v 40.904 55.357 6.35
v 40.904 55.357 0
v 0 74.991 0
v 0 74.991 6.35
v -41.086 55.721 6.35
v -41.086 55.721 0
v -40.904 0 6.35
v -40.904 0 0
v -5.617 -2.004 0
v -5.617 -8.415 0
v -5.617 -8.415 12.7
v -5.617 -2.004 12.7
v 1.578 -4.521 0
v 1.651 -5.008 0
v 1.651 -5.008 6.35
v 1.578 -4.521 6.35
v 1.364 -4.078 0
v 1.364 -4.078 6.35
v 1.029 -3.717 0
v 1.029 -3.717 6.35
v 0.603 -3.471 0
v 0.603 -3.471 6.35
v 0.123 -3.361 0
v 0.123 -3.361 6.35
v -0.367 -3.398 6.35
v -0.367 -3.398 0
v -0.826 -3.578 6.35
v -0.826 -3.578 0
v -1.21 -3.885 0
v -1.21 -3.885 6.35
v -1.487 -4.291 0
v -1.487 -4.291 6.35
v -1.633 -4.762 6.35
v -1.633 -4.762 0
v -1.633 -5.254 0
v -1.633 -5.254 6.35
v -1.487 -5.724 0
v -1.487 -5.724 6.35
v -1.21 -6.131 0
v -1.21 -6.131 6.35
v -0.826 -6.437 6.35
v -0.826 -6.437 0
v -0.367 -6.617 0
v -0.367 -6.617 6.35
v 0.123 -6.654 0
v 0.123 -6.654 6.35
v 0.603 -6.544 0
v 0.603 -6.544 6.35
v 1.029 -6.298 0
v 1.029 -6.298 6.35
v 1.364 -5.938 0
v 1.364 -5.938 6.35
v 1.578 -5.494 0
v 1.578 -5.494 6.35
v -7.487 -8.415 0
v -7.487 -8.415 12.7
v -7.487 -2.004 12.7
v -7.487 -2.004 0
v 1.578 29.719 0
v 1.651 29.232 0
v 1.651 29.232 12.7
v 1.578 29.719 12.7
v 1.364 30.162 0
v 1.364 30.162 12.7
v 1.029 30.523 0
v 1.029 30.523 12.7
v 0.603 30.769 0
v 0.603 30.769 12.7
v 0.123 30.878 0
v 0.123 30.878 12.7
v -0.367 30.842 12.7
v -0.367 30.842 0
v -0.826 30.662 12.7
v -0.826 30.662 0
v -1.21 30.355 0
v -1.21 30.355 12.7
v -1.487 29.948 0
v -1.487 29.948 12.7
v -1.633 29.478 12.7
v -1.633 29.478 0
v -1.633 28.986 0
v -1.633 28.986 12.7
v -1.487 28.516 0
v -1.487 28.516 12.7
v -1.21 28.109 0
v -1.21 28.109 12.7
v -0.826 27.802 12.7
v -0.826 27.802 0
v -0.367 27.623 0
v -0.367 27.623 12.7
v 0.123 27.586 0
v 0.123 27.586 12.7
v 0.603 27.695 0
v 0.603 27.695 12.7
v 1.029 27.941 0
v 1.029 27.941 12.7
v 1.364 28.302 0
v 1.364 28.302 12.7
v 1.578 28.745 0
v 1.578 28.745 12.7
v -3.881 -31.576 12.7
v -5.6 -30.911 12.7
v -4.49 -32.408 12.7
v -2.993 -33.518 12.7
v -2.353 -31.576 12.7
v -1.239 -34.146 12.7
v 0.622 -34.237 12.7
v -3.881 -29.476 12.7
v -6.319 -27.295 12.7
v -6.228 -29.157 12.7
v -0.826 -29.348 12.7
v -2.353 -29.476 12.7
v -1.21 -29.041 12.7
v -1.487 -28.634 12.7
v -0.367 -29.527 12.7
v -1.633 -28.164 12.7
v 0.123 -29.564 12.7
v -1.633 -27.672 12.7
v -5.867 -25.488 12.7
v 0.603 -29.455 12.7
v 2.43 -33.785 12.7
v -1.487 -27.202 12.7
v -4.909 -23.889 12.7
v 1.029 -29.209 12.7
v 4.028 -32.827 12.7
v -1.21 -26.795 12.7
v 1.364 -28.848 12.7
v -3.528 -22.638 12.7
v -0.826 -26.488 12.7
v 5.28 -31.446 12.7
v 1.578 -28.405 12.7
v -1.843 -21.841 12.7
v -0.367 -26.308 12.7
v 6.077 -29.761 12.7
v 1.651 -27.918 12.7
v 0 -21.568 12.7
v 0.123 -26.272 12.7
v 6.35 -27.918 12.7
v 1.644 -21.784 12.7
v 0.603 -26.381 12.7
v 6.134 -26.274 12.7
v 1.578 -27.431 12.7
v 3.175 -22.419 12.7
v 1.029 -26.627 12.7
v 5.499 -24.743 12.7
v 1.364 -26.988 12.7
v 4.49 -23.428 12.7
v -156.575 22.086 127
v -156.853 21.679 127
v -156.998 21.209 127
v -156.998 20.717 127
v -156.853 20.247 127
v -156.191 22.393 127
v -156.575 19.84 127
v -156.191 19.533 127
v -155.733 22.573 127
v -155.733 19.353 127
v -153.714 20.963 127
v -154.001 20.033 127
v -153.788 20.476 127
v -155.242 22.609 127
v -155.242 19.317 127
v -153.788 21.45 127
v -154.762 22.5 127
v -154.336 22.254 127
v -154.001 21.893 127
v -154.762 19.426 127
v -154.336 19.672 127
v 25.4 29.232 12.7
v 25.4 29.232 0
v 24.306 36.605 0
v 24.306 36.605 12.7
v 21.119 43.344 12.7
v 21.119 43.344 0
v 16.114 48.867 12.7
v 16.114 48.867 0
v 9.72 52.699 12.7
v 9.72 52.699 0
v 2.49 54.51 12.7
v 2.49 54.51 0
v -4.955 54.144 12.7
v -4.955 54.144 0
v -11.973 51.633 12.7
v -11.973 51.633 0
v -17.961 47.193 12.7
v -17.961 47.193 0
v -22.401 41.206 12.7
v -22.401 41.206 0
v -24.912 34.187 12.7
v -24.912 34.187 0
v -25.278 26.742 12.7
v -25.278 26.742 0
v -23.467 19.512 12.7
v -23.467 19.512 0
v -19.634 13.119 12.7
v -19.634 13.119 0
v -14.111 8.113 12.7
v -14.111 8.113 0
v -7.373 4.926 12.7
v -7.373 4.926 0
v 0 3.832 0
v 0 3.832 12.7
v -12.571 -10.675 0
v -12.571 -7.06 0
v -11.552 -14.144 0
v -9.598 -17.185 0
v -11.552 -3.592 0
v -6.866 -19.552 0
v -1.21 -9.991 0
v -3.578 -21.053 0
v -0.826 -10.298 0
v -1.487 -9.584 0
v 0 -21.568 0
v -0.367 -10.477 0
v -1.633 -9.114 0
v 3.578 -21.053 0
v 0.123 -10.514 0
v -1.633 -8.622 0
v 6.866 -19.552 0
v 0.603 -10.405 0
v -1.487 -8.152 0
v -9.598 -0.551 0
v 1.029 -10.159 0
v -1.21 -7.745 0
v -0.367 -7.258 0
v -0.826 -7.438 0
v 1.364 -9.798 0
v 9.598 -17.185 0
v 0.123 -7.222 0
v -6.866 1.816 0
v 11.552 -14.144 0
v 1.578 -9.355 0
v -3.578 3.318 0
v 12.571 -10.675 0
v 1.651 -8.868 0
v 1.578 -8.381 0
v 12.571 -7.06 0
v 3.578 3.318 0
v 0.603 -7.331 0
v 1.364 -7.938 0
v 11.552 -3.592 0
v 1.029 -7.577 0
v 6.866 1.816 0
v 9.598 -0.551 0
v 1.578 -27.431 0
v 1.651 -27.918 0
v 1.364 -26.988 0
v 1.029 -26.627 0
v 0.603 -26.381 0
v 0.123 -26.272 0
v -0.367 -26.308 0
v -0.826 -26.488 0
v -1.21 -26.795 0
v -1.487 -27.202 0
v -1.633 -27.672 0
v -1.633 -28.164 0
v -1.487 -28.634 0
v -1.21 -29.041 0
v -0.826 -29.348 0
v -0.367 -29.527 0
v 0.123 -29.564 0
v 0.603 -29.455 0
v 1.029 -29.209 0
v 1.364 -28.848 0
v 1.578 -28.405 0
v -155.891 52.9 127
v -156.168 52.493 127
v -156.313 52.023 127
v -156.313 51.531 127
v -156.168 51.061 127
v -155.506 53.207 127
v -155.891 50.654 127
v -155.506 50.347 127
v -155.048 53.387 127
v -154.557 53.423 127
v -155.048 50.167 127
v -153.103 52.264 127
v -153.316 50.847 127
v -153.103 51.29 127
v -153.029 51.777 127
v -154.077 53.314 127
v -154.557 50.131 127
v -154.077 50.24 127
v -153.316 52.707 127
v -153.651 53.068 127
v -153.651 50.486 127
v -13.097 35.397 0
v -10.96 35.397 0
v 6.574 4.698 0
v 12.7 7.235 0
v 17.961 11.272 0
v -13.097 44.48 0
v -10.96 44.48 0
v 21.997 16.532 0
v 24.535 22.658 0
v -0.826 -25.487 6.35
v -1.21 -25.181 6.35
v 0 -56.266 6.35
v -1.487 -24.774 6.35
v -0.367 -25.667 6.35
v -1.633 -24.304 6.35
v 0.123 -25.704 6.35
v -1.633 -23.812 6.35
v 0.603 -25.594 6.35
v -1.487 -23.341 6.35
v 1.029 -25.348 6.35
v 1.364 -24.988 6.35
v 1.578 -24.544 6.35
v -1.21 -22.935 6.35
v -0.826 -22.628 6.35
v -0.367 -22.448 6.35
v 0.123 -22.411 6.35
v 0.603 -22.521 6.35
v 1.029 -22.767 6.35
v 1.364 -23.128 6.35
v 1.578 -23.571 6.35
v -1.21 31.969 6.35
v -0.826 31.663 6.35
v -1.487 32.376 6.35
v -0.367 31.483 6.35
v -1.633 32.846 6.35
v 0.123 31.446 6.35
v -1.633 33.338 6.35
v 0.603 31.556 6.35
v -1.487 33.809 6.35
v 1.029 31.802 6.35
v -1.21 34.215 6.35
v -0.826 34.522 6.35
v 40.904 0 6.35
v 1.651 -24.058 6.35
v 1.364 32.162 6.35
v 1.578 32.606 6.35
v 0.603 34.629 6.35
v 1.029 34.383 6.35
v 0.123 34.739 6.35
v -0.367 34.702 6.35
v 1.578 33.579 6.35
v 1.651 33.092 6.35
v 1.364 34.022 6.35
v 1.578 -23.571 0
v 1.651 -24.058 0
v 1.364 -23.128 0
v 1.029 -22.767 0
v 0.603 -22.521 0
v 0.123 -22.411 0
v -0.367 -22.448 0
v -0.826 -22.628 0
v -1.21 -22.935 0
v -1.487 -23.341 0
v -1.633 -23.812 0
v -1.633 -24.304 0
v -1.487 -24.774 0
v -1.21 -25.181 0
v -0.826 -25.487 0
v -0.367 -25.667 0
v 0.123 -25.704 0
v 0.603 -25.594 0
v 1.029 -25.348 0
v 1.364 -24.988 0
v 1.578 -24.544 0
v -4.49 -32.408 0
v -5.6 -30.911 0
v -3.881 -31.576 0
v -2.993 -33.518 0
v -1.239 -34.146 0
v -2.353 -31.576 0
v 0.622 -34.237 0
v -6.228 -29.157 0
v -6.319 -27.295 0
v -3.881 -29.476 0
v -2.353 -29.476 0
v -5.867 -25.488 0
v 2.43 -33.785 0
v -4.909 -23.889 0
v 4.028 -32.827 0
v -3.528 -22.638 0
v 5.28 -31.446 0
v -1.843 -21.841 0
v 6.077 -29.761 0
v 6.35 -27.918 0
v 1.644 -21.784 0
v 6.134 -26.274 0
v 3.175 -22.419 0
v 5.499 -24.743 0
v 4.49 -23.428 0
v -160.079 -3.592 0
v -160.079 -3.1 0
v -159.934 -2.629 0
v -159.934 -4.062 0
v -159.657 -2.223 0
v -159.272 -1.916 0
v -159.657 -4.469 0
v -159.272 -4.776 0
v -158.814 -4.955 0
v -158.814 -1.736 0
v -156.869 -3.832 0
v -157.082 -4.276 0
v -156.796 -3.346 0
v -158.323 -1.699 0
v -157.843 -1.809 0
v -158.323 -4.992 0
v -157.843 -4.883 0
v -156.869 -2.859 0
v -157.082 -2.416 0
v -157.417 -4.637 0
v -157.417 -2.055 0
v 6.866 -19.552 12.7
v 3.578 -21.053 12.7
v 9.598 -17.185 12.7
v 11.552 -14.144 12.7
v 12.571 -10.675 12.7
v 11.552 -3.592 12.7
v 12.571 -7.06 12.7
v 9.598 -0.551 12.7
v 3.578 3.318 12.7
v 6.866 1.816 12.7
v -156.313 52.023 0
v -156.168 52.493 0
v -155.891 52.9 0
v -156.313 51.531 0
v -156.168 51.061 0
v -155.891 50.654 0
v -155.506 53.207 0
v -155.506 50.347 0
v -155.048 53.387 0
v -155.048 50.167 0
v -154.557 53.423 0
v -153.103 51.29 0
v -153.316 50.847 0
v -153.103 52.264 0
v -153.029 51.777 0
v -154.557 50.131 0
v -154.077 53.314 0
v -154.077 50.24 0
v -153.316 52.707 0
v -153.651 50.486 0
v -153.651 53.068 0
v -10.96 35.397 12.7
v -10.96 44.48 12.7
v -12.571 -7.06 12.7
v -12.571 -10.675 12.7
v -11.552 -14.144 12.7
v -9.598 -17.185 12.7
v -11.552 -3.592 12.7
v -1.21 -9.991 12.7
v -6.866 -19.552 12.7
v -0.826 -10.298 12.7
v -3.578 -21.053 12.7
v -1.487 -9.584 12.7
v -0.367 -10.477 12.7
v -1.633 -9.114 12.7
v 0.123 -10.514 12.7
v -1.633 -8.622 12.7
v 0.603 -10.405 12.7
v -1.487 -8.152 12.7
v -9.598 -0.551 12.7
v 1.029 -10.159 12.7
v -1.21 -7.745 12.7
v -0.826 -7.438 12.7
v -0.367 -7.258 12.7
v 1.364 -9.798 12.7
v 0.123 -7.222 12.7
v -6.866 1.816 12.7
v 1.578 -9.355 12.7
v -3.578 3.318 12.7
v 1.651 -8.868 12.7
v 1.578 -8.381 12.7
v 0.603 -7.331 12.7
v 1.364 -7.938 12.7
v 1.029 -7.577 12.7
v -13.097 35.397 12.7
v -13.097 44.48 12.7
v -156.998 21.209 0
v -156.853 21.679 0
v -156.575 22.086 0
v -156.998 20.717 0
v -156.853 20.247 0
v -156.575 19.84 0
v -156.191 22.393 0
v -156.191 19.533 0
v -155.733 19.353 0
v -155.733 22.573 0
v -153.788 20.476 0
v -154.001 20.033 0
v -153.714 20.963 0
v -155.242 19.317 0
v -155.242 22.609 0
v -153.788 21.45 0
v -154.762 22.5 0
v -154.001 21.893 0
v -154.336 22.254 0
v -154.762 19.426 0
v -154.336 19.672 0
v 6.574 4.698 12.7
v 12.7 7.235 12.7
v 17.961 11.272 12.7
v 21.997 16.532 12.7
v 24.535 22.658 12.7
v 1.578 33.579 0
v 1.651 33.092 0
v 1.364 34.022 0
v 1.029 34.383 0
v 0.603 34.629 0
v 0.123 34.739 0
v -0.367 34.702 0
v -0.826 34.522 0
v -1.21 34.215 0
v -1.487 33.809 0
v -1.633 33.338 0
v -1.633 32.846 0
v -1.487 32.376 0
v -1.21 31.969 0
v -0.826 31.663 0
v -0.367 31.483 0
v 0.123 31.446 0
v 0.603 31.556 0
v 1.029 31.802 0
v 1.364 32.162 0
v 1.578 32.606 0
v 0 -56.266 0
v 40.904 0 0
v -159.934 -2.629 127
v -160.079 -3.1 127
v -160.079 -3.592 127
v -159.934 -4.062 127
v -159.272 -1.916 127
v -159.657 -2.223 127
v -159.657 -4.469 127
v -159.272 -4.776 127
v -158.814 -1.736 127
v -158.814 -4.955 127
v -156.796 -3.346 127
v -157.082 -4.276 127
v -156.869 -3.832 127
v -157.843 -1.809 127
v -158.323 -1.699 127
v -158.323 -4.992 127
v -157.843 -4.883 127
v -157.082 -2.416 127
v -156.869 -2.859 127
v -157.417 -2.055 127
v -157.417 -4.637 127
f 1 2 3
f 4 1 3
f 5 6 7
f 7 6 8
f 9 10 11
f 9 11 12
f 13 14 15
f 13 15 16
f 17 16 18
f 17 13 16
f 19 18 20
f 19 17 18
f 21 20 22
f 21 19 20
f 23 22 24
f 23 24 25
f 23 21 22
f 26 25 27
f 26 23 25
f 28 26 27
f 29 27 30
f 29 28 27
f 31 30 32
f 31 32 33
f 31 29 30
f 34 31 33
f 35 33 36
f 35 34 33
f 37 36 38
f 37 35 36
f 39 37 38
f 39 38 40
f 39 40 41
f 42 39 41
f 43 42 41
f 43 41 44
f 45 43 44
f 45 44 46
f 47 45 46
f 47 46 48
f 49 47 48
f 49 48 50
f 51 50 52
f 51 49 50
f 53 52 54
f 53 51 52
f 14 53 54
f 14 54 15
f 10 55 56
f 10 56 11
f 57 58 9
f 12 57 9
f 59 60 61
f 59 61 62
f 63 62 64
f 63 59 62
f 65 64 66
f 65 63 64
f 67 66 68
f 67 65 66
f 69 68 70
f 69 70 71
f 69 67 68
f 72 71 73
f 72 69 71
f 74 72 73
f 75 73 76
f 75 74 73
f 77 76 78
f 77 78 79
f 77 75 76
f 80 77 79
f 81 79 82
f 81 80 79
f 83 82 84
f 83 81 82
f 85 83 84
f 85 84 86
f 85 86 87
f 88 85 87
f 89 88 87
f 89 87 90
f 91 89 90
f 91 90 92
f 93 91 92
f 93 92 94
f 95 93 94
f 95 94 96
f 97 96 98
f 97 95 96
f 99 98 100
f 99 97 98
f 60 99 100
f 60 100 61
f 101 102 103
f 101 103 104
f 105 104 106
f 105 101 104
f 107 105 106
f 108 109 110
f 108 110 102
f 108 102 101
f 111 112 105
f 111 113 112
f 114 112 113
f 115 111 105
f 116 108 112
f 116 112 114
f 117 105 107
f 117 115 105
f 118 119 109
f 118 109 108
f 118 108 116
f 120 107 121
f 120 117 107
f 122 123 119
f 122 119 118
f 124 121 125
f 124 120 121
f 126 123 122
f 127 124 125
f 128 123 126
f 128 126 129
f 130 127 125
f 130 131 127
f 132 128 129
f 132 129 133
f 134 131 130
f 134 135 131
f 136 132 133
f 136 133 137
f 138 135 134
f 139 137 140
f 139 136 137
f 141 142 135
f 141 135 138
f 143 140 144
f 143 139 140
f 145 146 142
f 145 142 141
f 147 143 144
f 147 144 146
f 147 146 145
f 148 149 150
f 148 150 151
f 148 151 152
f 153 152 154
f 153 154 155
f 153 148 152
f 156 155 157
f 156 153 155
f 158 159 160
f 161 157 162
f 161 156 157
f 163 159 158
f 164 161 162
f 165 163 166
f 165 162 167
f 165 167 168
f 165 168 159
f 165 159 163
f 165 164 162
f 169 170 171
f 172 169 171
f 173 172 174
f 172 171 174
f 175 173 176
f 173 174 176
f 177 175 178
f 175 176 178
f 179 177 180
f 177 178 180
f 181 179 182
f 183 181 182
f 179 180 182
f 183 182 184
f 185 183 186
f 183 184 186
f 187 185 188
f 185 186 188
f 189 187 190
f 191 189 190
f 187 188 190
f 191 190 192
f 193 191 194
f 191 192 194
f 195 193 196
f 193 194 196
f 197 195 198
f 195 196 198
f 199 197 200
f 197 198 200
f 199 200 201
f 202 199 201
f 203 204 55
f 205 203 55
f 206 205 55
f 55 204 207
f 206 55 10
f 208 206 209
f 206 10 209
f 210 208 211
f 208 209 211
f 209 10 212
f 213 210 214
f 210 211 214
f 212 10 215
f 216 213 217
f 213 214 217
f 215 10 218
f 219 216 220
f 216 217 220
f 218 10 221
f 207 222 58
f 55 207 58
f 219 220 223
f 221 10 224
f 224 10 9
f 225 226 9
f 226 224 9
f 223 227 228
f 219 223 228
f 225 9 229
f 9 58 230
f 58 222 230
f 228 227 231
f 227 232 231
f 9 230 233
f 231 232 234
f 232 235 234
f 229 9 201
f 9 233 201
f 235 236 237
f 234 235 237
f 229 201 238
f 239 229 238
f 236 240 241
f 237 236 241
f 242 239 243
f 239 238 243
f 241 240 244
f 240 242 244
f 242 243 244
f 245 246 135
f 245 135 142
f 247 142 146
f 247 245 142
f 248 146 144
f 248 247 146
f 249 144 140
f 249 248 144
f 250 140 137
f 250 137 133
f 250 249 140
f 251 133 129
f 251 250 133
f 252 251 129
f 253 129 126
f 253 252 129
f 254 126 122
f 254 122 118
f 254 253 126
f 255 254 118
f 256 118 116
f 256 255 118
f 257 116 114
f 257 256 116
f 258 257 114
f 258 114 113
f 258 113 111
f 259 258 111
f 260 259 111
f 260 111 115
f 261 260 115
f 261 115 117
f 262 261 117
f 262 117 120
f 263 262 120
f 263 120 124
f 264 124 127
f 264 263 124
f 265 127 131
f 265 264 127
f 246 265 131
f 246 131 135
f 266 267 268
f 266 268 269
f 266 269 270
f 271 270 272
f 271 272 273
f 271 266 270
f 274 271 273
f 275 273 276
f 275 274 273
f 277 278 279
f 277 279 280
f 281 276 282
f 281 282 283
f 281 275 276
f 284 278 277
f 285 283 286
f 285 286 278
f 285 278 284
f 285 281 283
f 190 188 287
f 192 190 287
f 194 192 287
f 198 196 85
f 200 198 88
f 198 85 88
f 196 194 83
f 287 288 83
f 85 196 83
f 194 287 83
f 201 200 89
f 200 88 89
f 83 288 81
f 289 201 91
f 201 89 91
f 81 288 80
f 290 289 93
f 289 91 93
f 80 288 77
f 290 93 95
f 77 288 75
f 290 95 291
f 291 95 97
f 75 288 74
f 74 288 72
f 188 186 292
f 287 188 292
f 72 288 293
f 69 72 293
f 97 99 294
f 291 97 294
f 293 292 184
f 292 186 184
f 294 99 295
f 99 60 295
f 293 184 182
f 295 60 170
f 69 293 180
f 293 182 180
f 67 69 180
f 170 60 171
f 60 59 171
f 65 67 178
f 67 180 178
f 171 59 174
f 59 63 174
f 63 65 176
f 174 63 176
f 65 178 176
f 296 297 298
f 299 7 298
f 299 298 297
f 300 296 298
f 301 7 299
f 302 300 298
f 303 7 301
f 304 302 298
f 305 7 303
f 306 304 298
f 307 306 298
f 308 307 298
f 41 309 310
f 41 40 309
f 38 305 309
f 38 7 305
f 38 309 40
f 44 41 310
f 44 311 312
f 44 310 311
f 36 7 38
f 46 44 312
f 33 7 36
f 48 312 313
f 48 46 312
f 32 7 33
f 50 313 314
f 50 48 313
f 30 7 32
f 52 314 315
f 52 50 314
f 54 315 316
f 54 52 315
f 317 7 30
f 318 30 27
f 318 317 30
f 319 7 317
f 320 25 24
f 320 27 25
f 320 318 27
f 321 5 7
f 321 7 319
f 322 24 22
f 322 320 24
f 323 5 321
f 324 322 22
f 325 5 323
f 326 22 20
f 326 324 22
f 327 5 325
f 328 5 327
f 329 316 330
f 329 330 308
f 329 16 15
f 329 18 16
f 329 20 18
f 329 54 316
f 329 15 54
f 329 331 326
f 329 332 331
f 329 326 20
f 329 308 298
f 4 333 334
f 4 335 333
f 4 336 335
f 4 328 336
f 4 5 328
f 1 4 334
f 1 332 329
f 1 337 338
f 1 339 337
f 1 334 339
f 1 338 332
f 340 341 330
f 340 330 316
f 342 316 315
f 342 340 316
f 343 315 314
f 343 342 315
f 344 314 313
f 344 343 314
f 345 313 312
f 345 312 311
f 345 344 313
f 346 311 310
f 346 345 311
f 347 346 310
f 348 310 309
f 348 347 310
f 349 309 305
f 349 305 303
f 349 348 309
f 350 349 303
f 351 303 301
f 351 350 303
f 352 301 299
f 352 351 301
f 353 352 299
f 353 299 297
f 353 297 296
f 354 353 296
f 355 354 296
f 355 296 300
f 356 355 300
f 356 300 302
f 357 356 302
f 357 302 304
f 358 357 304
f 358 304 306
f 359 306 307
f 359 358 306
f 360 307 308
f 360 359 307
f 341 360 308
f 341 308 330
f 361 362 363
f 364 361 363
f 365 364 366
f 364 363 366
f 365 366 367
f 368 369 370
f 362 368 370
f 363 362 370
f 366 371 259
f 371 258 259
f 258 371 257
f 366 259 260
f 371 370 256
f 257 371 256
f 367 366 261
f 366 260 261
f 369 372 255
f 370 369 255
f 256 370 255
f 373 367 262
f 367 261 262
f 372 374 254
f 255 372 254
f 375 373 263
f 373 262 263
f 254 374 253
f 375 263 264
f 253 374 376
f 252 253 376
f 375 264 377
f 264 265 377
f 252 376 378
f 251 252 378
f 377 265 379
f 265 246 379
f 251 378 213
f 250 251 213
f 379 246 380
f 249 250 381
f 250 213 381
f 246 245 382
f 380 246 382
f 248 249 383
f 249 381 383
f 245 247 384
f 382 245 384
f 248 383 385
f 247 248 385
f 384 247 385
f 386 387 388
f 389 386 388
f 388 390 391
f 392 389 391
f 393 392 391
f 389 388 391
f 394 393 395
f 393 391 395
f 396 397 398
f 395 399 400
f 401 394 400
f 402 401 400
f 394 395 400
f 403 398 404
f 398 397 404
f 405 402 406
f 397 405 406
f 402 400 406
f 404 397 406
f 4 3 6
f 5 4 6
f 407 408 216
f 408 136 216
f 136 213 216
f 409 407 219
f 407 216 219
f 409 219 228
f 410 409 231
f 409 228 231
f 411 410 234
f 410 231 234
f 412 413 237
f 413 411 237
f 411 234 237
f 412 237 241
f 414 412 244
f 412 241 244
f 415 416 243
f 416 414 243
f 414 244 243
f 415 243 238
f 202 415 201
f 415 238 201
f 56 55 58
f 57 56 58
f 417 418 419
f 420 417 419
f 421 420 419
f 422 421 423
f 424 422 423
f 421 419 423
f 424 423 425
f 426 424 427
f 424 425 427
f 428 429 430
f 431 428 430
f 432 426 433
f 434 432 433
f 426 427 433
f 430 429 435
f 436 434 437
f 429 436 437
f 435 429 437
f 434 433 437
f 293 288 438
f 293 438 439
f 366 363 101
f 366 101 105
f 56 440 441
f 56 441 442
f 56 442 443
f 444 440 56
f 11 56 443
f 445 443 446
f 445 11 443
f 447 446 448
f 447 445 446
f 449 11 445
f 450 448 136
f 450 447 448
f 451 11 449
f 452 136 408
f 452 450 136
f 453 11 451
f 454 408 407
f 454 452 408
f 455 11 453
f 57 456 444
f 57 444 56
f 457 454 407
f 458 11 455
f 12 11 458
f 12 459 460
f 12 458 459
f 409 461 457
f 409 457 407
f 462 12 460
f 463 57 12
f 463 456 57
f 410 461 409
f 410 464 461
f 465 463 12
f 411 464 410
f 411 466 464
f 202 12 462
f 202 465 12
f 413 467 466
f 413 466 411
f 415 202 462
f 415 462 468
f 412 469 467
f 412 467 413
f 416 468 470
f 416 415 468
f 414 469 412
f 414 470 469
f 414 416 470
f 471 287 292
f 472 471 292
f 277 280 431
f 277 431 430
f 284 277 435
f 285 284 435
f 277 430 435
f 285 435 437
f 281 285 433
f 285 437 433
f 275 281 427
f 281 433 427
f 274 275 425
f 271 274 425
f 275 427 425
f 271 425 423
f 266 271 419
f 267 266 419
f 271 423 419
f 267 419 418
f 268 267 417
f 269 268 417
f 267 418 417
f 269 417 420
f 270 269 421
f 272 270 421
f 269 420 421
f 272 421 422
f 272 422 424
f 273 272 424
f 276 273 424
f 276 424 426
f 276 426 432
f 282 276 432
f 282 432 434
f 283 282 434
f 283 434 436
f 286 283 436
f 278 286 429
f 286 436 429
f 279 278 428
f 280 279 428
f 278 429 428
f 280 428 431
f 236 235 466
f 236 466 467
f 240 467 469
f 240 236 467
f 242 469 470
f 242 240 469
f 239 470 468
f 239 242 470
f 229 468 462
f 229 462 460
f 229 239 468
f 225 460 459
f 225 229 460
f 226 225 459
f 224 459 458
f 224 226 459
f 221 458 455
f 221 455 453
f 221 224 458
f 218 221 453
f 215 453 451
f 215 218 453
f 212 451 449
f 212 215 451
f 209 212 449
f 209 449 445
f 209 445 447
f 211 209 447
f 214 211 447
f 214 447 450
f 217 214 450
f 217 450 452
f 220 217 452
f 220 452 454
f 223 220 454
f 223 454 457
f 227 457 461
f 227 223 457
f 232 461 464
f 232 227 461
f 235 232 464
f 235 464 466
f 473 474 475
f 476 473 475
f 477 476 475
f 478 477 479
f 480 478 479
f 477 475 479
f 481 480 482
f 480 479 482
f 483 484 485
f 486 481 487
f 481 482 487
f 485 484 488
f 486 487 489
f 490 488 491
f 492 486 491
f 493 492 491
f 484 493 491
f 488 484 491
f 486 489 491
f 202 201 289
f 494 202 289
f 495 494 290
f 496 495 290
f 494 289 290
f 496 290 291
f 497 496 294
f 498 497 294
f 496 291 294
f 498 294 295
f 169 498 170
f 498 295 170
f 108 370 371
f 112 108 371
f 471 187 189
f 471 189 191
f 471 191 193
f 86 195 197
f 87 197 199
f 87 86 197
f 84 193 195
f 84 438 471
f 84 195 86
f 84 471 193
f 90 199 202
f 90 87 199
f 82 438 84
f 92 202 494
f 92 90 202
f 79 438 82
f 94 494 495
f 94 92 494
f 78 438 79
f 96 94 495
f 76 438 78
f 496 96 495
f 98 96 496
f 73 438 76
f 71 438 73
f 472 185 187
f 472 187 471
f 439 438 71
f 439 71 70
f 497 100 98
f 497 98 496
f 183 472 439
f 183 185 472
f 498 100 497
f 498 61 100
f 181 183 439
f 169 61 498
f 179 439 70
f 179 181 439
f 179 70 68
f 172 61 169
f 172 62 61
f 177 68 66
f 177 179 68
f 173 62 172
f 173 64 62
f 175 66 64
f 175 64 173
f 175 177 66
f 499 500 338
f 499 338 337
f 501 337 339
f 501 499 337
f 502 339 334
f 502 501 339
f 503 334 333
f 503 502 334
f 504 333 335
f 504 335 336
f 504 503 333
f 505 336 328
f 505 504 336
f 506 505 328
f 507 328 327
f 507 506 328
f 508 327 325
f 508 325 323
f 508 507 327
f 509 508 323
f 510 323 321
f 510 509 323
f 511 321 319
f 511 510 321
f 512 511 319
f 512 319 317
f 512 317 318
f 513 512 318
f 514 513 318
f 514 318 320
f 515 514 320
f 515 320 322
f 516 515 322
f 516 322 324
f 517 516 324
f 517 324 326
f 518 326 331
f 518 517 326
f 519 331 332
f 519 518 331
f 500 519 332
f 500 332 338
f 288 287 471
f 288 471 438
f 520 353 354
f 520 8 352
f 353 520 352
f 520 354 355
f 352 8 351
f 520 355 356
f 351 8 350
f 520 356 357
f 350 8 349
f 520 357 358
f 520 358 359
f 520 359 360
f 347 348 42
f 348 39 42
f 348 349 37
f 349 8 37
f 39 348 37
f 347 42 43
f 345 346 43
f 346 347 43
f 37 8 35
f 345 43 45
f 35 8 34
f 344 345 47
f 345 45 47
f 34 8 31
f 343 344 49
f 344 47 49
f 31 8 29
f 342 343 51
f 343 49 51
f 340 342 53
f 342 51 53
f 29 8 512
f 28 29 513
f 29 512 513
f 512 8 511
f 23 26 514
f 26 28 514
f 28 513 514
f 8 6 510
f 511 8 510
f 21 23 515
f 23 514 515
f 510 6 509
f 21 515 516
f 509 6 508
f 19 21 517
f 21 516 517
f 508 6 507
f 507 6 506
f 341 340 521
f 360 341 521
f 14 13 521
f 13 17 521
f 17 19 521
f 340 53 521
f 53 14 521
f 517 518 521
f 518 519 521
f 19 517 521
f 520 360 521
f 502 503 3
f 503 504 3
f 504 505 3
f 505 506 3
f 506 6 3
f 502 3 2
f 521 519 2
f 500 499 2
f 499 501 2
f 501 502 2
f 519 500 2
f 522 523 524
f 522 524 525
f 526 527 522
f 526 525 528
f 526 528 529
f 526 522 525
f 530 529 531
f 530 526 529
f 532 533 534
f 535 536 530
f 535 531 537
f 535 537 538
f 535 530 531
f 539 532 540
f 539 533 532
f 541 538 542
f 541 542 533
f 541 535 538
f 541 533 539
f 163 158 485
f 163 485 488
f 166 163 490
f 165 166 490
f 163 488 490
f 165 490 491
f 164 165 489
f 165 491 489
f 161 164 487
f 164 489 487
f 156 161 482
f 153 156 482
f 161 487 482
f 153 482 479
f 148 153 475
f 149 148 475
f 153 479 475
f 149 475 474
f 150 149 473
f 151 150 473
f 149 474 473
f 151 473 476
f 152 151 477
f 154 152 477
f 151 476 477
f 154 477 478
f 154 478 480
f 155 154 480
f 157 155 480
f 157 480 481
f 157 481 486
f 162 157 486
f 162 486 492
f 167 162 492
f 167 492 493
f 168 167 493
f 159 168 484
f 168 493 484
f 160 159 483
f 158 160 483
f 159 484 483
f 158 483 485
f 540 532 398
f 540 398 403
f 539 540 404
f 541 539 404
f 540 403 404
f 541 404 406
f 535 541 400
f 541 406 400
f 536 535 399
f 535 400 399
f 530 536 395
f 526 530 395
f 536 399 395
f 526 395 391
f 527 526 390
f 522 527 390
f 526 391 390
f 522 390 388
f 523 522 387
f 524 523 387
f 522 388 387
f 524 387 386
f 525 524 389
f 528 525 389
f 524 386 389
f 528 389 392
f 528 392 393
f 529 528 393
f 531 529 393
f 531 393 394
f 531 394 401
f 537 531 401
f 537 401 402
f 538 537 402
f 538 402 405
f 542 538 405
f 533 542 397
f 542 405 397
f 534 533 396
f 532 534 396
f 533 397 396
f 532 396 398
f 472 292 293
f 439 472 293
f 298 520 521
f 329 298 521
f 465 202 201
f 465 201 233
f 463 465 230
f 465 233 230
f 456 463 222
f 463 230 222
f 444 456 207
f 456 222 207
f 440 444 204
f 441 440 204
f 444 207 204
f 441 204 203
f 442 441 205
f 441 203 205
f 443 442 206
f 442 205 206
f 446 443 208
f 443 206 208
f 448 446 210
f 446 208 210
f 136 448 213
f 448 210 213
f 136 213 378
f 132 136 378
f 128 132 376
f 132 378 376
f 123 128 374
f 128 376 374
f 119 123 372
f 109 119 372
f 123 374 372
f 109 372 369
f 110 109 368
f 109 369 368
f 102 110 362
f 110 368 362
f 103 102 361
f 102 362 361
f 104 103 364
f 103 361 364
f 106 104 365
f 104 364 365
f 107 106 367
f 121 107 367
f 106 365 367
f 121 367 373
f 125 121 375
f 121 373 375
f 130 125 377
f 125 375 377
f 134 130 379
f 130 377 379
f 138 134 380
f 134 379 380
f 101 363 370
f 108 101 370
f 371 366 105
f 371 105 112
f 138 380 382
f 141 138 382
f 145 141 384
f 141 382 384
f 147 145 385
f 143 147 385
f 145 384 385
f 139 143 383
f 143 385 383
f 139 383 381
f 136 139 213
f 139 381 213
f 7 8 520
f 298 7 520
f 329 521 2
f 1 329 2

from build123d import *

# Parameters (mm, degrees)
F1_R      = 25.4
F1_R_2    = 1.651
F1_W      = 2.137163
F1_H      = 9.082939
F4_DEPTH  = 12.7
F2_R      = 12.7
F2_R_2    = 1.651
F2_W      = 1.870019
F2_H      = 6.411486
F5_DEPTH  = 12.7
F3_R      = 6.35
F3_W      = 1.527725
F3_H      = 2.10062
F3_R_2    = 1.651
F6_DEPTH  = 12.7
F9_R      = 1.651
F10_DEPTH = 127
F8_R      = 1.651
F11_DEPTH = 127
F7_R      = 1.651
F12_DEPTH = 127
F0_R      = 1.651
F13_DEPTH = 6.35


with BuildPart() as f4:
    # F1 (on Top) → F4 (new body)
    with BuildSketch(Plane.XY):
        with Locations((0, 29.232109)):
            Circle(F1_R)
        with Locations((0, 29.232109)):
            Circle(F1_R_2, mode=Mode.SUBTRACT)
        with Locations((-12.028538, 39.938214)):
            Rectangle(F1_W, F1_H, mode=Mode.SUBTRACT)
    extrude(amount=F4_DEPTH)

    # F2 (on Top) → F5 (join)
    with BuildSketch(Plane.XY):
        with Locations((0, -8.867891)):
            Circle(F2_R)
        with Locations((0, -8.867891)):
            Circle(F2_R_2, mode=Mode.SUBTRACT)
        with Locations((-6.552061, -5.209332)):
            Rectangle(F2_W, F2_H, mode=Mode.SUBTRACT)
    extrude(amount=F5_DEPTH)

    # F3 (on Top) → F6 (join)
    with BuildSketch(Plane.XY):
        with Locations((0, -27.917891)):
            Circle(F3_R)
        with Locations((-3.116746, -30.52604)):
            Rectangle(F3_W, F3_H, mode=Mode.SUBTRACT)
        with Locations((0, -27.917891)):
            Circle(F3_R_2, mode=Mode.SUBTRACT)
    extrude(amount=F6_DEPTH)


with BuildPart() as f10:
    # F9 (on Top) → F10 (new body)
    with BuildSketch(Plane.XY):
        with Locations((-158.44661, -3.345834)):
            Circle(F9_R)
    extrude(amount=F10_DEPTH)


with BuildPart() as f11:
    # F8 (on Top) → F11 (new body)
    with BuildSketch(Plane.XY):
        with Locations((-155.365214, 20.962963)):
            Circle(F8_R)
    extrude(amount=F11_DEPTH)


with BuildPart() as f12:
    # F7 (on Top) → F12 (new body)
    with BuildSketch(Plane.XY):
        with Locations((-154.680461, 51.776934)):
            Circle(F7_R)
    extrude(amount=F12_DEPTH)


with BuildPart() as f13:
    # F0 (on Top) → F13 (new body)
    with BuildSketch(Plane.XY):
        Polygon((-41.08617, 55.720844), (-40.904372, 0), (0, -56.26624), (40.904372, 0), (40.904372, 55.357252), (0, 74.991348), align=None)
        with Locations((0, -24.057578)):
            Circle(F0_R, mode=Mode.SUBTRACT)
        with Locations((0, -5.007578)):
            Circle(F0_R, mode=Mode.SUBTRACT)
        with Locations((0, 33.092422)):
            Circle(F0_R, mode=Mode.SUBTRACT)
    extrude(amount=F13_DEPTH)


solid = Compound([f4.part, f10.part, f11.part, f12.part, f13.part])
